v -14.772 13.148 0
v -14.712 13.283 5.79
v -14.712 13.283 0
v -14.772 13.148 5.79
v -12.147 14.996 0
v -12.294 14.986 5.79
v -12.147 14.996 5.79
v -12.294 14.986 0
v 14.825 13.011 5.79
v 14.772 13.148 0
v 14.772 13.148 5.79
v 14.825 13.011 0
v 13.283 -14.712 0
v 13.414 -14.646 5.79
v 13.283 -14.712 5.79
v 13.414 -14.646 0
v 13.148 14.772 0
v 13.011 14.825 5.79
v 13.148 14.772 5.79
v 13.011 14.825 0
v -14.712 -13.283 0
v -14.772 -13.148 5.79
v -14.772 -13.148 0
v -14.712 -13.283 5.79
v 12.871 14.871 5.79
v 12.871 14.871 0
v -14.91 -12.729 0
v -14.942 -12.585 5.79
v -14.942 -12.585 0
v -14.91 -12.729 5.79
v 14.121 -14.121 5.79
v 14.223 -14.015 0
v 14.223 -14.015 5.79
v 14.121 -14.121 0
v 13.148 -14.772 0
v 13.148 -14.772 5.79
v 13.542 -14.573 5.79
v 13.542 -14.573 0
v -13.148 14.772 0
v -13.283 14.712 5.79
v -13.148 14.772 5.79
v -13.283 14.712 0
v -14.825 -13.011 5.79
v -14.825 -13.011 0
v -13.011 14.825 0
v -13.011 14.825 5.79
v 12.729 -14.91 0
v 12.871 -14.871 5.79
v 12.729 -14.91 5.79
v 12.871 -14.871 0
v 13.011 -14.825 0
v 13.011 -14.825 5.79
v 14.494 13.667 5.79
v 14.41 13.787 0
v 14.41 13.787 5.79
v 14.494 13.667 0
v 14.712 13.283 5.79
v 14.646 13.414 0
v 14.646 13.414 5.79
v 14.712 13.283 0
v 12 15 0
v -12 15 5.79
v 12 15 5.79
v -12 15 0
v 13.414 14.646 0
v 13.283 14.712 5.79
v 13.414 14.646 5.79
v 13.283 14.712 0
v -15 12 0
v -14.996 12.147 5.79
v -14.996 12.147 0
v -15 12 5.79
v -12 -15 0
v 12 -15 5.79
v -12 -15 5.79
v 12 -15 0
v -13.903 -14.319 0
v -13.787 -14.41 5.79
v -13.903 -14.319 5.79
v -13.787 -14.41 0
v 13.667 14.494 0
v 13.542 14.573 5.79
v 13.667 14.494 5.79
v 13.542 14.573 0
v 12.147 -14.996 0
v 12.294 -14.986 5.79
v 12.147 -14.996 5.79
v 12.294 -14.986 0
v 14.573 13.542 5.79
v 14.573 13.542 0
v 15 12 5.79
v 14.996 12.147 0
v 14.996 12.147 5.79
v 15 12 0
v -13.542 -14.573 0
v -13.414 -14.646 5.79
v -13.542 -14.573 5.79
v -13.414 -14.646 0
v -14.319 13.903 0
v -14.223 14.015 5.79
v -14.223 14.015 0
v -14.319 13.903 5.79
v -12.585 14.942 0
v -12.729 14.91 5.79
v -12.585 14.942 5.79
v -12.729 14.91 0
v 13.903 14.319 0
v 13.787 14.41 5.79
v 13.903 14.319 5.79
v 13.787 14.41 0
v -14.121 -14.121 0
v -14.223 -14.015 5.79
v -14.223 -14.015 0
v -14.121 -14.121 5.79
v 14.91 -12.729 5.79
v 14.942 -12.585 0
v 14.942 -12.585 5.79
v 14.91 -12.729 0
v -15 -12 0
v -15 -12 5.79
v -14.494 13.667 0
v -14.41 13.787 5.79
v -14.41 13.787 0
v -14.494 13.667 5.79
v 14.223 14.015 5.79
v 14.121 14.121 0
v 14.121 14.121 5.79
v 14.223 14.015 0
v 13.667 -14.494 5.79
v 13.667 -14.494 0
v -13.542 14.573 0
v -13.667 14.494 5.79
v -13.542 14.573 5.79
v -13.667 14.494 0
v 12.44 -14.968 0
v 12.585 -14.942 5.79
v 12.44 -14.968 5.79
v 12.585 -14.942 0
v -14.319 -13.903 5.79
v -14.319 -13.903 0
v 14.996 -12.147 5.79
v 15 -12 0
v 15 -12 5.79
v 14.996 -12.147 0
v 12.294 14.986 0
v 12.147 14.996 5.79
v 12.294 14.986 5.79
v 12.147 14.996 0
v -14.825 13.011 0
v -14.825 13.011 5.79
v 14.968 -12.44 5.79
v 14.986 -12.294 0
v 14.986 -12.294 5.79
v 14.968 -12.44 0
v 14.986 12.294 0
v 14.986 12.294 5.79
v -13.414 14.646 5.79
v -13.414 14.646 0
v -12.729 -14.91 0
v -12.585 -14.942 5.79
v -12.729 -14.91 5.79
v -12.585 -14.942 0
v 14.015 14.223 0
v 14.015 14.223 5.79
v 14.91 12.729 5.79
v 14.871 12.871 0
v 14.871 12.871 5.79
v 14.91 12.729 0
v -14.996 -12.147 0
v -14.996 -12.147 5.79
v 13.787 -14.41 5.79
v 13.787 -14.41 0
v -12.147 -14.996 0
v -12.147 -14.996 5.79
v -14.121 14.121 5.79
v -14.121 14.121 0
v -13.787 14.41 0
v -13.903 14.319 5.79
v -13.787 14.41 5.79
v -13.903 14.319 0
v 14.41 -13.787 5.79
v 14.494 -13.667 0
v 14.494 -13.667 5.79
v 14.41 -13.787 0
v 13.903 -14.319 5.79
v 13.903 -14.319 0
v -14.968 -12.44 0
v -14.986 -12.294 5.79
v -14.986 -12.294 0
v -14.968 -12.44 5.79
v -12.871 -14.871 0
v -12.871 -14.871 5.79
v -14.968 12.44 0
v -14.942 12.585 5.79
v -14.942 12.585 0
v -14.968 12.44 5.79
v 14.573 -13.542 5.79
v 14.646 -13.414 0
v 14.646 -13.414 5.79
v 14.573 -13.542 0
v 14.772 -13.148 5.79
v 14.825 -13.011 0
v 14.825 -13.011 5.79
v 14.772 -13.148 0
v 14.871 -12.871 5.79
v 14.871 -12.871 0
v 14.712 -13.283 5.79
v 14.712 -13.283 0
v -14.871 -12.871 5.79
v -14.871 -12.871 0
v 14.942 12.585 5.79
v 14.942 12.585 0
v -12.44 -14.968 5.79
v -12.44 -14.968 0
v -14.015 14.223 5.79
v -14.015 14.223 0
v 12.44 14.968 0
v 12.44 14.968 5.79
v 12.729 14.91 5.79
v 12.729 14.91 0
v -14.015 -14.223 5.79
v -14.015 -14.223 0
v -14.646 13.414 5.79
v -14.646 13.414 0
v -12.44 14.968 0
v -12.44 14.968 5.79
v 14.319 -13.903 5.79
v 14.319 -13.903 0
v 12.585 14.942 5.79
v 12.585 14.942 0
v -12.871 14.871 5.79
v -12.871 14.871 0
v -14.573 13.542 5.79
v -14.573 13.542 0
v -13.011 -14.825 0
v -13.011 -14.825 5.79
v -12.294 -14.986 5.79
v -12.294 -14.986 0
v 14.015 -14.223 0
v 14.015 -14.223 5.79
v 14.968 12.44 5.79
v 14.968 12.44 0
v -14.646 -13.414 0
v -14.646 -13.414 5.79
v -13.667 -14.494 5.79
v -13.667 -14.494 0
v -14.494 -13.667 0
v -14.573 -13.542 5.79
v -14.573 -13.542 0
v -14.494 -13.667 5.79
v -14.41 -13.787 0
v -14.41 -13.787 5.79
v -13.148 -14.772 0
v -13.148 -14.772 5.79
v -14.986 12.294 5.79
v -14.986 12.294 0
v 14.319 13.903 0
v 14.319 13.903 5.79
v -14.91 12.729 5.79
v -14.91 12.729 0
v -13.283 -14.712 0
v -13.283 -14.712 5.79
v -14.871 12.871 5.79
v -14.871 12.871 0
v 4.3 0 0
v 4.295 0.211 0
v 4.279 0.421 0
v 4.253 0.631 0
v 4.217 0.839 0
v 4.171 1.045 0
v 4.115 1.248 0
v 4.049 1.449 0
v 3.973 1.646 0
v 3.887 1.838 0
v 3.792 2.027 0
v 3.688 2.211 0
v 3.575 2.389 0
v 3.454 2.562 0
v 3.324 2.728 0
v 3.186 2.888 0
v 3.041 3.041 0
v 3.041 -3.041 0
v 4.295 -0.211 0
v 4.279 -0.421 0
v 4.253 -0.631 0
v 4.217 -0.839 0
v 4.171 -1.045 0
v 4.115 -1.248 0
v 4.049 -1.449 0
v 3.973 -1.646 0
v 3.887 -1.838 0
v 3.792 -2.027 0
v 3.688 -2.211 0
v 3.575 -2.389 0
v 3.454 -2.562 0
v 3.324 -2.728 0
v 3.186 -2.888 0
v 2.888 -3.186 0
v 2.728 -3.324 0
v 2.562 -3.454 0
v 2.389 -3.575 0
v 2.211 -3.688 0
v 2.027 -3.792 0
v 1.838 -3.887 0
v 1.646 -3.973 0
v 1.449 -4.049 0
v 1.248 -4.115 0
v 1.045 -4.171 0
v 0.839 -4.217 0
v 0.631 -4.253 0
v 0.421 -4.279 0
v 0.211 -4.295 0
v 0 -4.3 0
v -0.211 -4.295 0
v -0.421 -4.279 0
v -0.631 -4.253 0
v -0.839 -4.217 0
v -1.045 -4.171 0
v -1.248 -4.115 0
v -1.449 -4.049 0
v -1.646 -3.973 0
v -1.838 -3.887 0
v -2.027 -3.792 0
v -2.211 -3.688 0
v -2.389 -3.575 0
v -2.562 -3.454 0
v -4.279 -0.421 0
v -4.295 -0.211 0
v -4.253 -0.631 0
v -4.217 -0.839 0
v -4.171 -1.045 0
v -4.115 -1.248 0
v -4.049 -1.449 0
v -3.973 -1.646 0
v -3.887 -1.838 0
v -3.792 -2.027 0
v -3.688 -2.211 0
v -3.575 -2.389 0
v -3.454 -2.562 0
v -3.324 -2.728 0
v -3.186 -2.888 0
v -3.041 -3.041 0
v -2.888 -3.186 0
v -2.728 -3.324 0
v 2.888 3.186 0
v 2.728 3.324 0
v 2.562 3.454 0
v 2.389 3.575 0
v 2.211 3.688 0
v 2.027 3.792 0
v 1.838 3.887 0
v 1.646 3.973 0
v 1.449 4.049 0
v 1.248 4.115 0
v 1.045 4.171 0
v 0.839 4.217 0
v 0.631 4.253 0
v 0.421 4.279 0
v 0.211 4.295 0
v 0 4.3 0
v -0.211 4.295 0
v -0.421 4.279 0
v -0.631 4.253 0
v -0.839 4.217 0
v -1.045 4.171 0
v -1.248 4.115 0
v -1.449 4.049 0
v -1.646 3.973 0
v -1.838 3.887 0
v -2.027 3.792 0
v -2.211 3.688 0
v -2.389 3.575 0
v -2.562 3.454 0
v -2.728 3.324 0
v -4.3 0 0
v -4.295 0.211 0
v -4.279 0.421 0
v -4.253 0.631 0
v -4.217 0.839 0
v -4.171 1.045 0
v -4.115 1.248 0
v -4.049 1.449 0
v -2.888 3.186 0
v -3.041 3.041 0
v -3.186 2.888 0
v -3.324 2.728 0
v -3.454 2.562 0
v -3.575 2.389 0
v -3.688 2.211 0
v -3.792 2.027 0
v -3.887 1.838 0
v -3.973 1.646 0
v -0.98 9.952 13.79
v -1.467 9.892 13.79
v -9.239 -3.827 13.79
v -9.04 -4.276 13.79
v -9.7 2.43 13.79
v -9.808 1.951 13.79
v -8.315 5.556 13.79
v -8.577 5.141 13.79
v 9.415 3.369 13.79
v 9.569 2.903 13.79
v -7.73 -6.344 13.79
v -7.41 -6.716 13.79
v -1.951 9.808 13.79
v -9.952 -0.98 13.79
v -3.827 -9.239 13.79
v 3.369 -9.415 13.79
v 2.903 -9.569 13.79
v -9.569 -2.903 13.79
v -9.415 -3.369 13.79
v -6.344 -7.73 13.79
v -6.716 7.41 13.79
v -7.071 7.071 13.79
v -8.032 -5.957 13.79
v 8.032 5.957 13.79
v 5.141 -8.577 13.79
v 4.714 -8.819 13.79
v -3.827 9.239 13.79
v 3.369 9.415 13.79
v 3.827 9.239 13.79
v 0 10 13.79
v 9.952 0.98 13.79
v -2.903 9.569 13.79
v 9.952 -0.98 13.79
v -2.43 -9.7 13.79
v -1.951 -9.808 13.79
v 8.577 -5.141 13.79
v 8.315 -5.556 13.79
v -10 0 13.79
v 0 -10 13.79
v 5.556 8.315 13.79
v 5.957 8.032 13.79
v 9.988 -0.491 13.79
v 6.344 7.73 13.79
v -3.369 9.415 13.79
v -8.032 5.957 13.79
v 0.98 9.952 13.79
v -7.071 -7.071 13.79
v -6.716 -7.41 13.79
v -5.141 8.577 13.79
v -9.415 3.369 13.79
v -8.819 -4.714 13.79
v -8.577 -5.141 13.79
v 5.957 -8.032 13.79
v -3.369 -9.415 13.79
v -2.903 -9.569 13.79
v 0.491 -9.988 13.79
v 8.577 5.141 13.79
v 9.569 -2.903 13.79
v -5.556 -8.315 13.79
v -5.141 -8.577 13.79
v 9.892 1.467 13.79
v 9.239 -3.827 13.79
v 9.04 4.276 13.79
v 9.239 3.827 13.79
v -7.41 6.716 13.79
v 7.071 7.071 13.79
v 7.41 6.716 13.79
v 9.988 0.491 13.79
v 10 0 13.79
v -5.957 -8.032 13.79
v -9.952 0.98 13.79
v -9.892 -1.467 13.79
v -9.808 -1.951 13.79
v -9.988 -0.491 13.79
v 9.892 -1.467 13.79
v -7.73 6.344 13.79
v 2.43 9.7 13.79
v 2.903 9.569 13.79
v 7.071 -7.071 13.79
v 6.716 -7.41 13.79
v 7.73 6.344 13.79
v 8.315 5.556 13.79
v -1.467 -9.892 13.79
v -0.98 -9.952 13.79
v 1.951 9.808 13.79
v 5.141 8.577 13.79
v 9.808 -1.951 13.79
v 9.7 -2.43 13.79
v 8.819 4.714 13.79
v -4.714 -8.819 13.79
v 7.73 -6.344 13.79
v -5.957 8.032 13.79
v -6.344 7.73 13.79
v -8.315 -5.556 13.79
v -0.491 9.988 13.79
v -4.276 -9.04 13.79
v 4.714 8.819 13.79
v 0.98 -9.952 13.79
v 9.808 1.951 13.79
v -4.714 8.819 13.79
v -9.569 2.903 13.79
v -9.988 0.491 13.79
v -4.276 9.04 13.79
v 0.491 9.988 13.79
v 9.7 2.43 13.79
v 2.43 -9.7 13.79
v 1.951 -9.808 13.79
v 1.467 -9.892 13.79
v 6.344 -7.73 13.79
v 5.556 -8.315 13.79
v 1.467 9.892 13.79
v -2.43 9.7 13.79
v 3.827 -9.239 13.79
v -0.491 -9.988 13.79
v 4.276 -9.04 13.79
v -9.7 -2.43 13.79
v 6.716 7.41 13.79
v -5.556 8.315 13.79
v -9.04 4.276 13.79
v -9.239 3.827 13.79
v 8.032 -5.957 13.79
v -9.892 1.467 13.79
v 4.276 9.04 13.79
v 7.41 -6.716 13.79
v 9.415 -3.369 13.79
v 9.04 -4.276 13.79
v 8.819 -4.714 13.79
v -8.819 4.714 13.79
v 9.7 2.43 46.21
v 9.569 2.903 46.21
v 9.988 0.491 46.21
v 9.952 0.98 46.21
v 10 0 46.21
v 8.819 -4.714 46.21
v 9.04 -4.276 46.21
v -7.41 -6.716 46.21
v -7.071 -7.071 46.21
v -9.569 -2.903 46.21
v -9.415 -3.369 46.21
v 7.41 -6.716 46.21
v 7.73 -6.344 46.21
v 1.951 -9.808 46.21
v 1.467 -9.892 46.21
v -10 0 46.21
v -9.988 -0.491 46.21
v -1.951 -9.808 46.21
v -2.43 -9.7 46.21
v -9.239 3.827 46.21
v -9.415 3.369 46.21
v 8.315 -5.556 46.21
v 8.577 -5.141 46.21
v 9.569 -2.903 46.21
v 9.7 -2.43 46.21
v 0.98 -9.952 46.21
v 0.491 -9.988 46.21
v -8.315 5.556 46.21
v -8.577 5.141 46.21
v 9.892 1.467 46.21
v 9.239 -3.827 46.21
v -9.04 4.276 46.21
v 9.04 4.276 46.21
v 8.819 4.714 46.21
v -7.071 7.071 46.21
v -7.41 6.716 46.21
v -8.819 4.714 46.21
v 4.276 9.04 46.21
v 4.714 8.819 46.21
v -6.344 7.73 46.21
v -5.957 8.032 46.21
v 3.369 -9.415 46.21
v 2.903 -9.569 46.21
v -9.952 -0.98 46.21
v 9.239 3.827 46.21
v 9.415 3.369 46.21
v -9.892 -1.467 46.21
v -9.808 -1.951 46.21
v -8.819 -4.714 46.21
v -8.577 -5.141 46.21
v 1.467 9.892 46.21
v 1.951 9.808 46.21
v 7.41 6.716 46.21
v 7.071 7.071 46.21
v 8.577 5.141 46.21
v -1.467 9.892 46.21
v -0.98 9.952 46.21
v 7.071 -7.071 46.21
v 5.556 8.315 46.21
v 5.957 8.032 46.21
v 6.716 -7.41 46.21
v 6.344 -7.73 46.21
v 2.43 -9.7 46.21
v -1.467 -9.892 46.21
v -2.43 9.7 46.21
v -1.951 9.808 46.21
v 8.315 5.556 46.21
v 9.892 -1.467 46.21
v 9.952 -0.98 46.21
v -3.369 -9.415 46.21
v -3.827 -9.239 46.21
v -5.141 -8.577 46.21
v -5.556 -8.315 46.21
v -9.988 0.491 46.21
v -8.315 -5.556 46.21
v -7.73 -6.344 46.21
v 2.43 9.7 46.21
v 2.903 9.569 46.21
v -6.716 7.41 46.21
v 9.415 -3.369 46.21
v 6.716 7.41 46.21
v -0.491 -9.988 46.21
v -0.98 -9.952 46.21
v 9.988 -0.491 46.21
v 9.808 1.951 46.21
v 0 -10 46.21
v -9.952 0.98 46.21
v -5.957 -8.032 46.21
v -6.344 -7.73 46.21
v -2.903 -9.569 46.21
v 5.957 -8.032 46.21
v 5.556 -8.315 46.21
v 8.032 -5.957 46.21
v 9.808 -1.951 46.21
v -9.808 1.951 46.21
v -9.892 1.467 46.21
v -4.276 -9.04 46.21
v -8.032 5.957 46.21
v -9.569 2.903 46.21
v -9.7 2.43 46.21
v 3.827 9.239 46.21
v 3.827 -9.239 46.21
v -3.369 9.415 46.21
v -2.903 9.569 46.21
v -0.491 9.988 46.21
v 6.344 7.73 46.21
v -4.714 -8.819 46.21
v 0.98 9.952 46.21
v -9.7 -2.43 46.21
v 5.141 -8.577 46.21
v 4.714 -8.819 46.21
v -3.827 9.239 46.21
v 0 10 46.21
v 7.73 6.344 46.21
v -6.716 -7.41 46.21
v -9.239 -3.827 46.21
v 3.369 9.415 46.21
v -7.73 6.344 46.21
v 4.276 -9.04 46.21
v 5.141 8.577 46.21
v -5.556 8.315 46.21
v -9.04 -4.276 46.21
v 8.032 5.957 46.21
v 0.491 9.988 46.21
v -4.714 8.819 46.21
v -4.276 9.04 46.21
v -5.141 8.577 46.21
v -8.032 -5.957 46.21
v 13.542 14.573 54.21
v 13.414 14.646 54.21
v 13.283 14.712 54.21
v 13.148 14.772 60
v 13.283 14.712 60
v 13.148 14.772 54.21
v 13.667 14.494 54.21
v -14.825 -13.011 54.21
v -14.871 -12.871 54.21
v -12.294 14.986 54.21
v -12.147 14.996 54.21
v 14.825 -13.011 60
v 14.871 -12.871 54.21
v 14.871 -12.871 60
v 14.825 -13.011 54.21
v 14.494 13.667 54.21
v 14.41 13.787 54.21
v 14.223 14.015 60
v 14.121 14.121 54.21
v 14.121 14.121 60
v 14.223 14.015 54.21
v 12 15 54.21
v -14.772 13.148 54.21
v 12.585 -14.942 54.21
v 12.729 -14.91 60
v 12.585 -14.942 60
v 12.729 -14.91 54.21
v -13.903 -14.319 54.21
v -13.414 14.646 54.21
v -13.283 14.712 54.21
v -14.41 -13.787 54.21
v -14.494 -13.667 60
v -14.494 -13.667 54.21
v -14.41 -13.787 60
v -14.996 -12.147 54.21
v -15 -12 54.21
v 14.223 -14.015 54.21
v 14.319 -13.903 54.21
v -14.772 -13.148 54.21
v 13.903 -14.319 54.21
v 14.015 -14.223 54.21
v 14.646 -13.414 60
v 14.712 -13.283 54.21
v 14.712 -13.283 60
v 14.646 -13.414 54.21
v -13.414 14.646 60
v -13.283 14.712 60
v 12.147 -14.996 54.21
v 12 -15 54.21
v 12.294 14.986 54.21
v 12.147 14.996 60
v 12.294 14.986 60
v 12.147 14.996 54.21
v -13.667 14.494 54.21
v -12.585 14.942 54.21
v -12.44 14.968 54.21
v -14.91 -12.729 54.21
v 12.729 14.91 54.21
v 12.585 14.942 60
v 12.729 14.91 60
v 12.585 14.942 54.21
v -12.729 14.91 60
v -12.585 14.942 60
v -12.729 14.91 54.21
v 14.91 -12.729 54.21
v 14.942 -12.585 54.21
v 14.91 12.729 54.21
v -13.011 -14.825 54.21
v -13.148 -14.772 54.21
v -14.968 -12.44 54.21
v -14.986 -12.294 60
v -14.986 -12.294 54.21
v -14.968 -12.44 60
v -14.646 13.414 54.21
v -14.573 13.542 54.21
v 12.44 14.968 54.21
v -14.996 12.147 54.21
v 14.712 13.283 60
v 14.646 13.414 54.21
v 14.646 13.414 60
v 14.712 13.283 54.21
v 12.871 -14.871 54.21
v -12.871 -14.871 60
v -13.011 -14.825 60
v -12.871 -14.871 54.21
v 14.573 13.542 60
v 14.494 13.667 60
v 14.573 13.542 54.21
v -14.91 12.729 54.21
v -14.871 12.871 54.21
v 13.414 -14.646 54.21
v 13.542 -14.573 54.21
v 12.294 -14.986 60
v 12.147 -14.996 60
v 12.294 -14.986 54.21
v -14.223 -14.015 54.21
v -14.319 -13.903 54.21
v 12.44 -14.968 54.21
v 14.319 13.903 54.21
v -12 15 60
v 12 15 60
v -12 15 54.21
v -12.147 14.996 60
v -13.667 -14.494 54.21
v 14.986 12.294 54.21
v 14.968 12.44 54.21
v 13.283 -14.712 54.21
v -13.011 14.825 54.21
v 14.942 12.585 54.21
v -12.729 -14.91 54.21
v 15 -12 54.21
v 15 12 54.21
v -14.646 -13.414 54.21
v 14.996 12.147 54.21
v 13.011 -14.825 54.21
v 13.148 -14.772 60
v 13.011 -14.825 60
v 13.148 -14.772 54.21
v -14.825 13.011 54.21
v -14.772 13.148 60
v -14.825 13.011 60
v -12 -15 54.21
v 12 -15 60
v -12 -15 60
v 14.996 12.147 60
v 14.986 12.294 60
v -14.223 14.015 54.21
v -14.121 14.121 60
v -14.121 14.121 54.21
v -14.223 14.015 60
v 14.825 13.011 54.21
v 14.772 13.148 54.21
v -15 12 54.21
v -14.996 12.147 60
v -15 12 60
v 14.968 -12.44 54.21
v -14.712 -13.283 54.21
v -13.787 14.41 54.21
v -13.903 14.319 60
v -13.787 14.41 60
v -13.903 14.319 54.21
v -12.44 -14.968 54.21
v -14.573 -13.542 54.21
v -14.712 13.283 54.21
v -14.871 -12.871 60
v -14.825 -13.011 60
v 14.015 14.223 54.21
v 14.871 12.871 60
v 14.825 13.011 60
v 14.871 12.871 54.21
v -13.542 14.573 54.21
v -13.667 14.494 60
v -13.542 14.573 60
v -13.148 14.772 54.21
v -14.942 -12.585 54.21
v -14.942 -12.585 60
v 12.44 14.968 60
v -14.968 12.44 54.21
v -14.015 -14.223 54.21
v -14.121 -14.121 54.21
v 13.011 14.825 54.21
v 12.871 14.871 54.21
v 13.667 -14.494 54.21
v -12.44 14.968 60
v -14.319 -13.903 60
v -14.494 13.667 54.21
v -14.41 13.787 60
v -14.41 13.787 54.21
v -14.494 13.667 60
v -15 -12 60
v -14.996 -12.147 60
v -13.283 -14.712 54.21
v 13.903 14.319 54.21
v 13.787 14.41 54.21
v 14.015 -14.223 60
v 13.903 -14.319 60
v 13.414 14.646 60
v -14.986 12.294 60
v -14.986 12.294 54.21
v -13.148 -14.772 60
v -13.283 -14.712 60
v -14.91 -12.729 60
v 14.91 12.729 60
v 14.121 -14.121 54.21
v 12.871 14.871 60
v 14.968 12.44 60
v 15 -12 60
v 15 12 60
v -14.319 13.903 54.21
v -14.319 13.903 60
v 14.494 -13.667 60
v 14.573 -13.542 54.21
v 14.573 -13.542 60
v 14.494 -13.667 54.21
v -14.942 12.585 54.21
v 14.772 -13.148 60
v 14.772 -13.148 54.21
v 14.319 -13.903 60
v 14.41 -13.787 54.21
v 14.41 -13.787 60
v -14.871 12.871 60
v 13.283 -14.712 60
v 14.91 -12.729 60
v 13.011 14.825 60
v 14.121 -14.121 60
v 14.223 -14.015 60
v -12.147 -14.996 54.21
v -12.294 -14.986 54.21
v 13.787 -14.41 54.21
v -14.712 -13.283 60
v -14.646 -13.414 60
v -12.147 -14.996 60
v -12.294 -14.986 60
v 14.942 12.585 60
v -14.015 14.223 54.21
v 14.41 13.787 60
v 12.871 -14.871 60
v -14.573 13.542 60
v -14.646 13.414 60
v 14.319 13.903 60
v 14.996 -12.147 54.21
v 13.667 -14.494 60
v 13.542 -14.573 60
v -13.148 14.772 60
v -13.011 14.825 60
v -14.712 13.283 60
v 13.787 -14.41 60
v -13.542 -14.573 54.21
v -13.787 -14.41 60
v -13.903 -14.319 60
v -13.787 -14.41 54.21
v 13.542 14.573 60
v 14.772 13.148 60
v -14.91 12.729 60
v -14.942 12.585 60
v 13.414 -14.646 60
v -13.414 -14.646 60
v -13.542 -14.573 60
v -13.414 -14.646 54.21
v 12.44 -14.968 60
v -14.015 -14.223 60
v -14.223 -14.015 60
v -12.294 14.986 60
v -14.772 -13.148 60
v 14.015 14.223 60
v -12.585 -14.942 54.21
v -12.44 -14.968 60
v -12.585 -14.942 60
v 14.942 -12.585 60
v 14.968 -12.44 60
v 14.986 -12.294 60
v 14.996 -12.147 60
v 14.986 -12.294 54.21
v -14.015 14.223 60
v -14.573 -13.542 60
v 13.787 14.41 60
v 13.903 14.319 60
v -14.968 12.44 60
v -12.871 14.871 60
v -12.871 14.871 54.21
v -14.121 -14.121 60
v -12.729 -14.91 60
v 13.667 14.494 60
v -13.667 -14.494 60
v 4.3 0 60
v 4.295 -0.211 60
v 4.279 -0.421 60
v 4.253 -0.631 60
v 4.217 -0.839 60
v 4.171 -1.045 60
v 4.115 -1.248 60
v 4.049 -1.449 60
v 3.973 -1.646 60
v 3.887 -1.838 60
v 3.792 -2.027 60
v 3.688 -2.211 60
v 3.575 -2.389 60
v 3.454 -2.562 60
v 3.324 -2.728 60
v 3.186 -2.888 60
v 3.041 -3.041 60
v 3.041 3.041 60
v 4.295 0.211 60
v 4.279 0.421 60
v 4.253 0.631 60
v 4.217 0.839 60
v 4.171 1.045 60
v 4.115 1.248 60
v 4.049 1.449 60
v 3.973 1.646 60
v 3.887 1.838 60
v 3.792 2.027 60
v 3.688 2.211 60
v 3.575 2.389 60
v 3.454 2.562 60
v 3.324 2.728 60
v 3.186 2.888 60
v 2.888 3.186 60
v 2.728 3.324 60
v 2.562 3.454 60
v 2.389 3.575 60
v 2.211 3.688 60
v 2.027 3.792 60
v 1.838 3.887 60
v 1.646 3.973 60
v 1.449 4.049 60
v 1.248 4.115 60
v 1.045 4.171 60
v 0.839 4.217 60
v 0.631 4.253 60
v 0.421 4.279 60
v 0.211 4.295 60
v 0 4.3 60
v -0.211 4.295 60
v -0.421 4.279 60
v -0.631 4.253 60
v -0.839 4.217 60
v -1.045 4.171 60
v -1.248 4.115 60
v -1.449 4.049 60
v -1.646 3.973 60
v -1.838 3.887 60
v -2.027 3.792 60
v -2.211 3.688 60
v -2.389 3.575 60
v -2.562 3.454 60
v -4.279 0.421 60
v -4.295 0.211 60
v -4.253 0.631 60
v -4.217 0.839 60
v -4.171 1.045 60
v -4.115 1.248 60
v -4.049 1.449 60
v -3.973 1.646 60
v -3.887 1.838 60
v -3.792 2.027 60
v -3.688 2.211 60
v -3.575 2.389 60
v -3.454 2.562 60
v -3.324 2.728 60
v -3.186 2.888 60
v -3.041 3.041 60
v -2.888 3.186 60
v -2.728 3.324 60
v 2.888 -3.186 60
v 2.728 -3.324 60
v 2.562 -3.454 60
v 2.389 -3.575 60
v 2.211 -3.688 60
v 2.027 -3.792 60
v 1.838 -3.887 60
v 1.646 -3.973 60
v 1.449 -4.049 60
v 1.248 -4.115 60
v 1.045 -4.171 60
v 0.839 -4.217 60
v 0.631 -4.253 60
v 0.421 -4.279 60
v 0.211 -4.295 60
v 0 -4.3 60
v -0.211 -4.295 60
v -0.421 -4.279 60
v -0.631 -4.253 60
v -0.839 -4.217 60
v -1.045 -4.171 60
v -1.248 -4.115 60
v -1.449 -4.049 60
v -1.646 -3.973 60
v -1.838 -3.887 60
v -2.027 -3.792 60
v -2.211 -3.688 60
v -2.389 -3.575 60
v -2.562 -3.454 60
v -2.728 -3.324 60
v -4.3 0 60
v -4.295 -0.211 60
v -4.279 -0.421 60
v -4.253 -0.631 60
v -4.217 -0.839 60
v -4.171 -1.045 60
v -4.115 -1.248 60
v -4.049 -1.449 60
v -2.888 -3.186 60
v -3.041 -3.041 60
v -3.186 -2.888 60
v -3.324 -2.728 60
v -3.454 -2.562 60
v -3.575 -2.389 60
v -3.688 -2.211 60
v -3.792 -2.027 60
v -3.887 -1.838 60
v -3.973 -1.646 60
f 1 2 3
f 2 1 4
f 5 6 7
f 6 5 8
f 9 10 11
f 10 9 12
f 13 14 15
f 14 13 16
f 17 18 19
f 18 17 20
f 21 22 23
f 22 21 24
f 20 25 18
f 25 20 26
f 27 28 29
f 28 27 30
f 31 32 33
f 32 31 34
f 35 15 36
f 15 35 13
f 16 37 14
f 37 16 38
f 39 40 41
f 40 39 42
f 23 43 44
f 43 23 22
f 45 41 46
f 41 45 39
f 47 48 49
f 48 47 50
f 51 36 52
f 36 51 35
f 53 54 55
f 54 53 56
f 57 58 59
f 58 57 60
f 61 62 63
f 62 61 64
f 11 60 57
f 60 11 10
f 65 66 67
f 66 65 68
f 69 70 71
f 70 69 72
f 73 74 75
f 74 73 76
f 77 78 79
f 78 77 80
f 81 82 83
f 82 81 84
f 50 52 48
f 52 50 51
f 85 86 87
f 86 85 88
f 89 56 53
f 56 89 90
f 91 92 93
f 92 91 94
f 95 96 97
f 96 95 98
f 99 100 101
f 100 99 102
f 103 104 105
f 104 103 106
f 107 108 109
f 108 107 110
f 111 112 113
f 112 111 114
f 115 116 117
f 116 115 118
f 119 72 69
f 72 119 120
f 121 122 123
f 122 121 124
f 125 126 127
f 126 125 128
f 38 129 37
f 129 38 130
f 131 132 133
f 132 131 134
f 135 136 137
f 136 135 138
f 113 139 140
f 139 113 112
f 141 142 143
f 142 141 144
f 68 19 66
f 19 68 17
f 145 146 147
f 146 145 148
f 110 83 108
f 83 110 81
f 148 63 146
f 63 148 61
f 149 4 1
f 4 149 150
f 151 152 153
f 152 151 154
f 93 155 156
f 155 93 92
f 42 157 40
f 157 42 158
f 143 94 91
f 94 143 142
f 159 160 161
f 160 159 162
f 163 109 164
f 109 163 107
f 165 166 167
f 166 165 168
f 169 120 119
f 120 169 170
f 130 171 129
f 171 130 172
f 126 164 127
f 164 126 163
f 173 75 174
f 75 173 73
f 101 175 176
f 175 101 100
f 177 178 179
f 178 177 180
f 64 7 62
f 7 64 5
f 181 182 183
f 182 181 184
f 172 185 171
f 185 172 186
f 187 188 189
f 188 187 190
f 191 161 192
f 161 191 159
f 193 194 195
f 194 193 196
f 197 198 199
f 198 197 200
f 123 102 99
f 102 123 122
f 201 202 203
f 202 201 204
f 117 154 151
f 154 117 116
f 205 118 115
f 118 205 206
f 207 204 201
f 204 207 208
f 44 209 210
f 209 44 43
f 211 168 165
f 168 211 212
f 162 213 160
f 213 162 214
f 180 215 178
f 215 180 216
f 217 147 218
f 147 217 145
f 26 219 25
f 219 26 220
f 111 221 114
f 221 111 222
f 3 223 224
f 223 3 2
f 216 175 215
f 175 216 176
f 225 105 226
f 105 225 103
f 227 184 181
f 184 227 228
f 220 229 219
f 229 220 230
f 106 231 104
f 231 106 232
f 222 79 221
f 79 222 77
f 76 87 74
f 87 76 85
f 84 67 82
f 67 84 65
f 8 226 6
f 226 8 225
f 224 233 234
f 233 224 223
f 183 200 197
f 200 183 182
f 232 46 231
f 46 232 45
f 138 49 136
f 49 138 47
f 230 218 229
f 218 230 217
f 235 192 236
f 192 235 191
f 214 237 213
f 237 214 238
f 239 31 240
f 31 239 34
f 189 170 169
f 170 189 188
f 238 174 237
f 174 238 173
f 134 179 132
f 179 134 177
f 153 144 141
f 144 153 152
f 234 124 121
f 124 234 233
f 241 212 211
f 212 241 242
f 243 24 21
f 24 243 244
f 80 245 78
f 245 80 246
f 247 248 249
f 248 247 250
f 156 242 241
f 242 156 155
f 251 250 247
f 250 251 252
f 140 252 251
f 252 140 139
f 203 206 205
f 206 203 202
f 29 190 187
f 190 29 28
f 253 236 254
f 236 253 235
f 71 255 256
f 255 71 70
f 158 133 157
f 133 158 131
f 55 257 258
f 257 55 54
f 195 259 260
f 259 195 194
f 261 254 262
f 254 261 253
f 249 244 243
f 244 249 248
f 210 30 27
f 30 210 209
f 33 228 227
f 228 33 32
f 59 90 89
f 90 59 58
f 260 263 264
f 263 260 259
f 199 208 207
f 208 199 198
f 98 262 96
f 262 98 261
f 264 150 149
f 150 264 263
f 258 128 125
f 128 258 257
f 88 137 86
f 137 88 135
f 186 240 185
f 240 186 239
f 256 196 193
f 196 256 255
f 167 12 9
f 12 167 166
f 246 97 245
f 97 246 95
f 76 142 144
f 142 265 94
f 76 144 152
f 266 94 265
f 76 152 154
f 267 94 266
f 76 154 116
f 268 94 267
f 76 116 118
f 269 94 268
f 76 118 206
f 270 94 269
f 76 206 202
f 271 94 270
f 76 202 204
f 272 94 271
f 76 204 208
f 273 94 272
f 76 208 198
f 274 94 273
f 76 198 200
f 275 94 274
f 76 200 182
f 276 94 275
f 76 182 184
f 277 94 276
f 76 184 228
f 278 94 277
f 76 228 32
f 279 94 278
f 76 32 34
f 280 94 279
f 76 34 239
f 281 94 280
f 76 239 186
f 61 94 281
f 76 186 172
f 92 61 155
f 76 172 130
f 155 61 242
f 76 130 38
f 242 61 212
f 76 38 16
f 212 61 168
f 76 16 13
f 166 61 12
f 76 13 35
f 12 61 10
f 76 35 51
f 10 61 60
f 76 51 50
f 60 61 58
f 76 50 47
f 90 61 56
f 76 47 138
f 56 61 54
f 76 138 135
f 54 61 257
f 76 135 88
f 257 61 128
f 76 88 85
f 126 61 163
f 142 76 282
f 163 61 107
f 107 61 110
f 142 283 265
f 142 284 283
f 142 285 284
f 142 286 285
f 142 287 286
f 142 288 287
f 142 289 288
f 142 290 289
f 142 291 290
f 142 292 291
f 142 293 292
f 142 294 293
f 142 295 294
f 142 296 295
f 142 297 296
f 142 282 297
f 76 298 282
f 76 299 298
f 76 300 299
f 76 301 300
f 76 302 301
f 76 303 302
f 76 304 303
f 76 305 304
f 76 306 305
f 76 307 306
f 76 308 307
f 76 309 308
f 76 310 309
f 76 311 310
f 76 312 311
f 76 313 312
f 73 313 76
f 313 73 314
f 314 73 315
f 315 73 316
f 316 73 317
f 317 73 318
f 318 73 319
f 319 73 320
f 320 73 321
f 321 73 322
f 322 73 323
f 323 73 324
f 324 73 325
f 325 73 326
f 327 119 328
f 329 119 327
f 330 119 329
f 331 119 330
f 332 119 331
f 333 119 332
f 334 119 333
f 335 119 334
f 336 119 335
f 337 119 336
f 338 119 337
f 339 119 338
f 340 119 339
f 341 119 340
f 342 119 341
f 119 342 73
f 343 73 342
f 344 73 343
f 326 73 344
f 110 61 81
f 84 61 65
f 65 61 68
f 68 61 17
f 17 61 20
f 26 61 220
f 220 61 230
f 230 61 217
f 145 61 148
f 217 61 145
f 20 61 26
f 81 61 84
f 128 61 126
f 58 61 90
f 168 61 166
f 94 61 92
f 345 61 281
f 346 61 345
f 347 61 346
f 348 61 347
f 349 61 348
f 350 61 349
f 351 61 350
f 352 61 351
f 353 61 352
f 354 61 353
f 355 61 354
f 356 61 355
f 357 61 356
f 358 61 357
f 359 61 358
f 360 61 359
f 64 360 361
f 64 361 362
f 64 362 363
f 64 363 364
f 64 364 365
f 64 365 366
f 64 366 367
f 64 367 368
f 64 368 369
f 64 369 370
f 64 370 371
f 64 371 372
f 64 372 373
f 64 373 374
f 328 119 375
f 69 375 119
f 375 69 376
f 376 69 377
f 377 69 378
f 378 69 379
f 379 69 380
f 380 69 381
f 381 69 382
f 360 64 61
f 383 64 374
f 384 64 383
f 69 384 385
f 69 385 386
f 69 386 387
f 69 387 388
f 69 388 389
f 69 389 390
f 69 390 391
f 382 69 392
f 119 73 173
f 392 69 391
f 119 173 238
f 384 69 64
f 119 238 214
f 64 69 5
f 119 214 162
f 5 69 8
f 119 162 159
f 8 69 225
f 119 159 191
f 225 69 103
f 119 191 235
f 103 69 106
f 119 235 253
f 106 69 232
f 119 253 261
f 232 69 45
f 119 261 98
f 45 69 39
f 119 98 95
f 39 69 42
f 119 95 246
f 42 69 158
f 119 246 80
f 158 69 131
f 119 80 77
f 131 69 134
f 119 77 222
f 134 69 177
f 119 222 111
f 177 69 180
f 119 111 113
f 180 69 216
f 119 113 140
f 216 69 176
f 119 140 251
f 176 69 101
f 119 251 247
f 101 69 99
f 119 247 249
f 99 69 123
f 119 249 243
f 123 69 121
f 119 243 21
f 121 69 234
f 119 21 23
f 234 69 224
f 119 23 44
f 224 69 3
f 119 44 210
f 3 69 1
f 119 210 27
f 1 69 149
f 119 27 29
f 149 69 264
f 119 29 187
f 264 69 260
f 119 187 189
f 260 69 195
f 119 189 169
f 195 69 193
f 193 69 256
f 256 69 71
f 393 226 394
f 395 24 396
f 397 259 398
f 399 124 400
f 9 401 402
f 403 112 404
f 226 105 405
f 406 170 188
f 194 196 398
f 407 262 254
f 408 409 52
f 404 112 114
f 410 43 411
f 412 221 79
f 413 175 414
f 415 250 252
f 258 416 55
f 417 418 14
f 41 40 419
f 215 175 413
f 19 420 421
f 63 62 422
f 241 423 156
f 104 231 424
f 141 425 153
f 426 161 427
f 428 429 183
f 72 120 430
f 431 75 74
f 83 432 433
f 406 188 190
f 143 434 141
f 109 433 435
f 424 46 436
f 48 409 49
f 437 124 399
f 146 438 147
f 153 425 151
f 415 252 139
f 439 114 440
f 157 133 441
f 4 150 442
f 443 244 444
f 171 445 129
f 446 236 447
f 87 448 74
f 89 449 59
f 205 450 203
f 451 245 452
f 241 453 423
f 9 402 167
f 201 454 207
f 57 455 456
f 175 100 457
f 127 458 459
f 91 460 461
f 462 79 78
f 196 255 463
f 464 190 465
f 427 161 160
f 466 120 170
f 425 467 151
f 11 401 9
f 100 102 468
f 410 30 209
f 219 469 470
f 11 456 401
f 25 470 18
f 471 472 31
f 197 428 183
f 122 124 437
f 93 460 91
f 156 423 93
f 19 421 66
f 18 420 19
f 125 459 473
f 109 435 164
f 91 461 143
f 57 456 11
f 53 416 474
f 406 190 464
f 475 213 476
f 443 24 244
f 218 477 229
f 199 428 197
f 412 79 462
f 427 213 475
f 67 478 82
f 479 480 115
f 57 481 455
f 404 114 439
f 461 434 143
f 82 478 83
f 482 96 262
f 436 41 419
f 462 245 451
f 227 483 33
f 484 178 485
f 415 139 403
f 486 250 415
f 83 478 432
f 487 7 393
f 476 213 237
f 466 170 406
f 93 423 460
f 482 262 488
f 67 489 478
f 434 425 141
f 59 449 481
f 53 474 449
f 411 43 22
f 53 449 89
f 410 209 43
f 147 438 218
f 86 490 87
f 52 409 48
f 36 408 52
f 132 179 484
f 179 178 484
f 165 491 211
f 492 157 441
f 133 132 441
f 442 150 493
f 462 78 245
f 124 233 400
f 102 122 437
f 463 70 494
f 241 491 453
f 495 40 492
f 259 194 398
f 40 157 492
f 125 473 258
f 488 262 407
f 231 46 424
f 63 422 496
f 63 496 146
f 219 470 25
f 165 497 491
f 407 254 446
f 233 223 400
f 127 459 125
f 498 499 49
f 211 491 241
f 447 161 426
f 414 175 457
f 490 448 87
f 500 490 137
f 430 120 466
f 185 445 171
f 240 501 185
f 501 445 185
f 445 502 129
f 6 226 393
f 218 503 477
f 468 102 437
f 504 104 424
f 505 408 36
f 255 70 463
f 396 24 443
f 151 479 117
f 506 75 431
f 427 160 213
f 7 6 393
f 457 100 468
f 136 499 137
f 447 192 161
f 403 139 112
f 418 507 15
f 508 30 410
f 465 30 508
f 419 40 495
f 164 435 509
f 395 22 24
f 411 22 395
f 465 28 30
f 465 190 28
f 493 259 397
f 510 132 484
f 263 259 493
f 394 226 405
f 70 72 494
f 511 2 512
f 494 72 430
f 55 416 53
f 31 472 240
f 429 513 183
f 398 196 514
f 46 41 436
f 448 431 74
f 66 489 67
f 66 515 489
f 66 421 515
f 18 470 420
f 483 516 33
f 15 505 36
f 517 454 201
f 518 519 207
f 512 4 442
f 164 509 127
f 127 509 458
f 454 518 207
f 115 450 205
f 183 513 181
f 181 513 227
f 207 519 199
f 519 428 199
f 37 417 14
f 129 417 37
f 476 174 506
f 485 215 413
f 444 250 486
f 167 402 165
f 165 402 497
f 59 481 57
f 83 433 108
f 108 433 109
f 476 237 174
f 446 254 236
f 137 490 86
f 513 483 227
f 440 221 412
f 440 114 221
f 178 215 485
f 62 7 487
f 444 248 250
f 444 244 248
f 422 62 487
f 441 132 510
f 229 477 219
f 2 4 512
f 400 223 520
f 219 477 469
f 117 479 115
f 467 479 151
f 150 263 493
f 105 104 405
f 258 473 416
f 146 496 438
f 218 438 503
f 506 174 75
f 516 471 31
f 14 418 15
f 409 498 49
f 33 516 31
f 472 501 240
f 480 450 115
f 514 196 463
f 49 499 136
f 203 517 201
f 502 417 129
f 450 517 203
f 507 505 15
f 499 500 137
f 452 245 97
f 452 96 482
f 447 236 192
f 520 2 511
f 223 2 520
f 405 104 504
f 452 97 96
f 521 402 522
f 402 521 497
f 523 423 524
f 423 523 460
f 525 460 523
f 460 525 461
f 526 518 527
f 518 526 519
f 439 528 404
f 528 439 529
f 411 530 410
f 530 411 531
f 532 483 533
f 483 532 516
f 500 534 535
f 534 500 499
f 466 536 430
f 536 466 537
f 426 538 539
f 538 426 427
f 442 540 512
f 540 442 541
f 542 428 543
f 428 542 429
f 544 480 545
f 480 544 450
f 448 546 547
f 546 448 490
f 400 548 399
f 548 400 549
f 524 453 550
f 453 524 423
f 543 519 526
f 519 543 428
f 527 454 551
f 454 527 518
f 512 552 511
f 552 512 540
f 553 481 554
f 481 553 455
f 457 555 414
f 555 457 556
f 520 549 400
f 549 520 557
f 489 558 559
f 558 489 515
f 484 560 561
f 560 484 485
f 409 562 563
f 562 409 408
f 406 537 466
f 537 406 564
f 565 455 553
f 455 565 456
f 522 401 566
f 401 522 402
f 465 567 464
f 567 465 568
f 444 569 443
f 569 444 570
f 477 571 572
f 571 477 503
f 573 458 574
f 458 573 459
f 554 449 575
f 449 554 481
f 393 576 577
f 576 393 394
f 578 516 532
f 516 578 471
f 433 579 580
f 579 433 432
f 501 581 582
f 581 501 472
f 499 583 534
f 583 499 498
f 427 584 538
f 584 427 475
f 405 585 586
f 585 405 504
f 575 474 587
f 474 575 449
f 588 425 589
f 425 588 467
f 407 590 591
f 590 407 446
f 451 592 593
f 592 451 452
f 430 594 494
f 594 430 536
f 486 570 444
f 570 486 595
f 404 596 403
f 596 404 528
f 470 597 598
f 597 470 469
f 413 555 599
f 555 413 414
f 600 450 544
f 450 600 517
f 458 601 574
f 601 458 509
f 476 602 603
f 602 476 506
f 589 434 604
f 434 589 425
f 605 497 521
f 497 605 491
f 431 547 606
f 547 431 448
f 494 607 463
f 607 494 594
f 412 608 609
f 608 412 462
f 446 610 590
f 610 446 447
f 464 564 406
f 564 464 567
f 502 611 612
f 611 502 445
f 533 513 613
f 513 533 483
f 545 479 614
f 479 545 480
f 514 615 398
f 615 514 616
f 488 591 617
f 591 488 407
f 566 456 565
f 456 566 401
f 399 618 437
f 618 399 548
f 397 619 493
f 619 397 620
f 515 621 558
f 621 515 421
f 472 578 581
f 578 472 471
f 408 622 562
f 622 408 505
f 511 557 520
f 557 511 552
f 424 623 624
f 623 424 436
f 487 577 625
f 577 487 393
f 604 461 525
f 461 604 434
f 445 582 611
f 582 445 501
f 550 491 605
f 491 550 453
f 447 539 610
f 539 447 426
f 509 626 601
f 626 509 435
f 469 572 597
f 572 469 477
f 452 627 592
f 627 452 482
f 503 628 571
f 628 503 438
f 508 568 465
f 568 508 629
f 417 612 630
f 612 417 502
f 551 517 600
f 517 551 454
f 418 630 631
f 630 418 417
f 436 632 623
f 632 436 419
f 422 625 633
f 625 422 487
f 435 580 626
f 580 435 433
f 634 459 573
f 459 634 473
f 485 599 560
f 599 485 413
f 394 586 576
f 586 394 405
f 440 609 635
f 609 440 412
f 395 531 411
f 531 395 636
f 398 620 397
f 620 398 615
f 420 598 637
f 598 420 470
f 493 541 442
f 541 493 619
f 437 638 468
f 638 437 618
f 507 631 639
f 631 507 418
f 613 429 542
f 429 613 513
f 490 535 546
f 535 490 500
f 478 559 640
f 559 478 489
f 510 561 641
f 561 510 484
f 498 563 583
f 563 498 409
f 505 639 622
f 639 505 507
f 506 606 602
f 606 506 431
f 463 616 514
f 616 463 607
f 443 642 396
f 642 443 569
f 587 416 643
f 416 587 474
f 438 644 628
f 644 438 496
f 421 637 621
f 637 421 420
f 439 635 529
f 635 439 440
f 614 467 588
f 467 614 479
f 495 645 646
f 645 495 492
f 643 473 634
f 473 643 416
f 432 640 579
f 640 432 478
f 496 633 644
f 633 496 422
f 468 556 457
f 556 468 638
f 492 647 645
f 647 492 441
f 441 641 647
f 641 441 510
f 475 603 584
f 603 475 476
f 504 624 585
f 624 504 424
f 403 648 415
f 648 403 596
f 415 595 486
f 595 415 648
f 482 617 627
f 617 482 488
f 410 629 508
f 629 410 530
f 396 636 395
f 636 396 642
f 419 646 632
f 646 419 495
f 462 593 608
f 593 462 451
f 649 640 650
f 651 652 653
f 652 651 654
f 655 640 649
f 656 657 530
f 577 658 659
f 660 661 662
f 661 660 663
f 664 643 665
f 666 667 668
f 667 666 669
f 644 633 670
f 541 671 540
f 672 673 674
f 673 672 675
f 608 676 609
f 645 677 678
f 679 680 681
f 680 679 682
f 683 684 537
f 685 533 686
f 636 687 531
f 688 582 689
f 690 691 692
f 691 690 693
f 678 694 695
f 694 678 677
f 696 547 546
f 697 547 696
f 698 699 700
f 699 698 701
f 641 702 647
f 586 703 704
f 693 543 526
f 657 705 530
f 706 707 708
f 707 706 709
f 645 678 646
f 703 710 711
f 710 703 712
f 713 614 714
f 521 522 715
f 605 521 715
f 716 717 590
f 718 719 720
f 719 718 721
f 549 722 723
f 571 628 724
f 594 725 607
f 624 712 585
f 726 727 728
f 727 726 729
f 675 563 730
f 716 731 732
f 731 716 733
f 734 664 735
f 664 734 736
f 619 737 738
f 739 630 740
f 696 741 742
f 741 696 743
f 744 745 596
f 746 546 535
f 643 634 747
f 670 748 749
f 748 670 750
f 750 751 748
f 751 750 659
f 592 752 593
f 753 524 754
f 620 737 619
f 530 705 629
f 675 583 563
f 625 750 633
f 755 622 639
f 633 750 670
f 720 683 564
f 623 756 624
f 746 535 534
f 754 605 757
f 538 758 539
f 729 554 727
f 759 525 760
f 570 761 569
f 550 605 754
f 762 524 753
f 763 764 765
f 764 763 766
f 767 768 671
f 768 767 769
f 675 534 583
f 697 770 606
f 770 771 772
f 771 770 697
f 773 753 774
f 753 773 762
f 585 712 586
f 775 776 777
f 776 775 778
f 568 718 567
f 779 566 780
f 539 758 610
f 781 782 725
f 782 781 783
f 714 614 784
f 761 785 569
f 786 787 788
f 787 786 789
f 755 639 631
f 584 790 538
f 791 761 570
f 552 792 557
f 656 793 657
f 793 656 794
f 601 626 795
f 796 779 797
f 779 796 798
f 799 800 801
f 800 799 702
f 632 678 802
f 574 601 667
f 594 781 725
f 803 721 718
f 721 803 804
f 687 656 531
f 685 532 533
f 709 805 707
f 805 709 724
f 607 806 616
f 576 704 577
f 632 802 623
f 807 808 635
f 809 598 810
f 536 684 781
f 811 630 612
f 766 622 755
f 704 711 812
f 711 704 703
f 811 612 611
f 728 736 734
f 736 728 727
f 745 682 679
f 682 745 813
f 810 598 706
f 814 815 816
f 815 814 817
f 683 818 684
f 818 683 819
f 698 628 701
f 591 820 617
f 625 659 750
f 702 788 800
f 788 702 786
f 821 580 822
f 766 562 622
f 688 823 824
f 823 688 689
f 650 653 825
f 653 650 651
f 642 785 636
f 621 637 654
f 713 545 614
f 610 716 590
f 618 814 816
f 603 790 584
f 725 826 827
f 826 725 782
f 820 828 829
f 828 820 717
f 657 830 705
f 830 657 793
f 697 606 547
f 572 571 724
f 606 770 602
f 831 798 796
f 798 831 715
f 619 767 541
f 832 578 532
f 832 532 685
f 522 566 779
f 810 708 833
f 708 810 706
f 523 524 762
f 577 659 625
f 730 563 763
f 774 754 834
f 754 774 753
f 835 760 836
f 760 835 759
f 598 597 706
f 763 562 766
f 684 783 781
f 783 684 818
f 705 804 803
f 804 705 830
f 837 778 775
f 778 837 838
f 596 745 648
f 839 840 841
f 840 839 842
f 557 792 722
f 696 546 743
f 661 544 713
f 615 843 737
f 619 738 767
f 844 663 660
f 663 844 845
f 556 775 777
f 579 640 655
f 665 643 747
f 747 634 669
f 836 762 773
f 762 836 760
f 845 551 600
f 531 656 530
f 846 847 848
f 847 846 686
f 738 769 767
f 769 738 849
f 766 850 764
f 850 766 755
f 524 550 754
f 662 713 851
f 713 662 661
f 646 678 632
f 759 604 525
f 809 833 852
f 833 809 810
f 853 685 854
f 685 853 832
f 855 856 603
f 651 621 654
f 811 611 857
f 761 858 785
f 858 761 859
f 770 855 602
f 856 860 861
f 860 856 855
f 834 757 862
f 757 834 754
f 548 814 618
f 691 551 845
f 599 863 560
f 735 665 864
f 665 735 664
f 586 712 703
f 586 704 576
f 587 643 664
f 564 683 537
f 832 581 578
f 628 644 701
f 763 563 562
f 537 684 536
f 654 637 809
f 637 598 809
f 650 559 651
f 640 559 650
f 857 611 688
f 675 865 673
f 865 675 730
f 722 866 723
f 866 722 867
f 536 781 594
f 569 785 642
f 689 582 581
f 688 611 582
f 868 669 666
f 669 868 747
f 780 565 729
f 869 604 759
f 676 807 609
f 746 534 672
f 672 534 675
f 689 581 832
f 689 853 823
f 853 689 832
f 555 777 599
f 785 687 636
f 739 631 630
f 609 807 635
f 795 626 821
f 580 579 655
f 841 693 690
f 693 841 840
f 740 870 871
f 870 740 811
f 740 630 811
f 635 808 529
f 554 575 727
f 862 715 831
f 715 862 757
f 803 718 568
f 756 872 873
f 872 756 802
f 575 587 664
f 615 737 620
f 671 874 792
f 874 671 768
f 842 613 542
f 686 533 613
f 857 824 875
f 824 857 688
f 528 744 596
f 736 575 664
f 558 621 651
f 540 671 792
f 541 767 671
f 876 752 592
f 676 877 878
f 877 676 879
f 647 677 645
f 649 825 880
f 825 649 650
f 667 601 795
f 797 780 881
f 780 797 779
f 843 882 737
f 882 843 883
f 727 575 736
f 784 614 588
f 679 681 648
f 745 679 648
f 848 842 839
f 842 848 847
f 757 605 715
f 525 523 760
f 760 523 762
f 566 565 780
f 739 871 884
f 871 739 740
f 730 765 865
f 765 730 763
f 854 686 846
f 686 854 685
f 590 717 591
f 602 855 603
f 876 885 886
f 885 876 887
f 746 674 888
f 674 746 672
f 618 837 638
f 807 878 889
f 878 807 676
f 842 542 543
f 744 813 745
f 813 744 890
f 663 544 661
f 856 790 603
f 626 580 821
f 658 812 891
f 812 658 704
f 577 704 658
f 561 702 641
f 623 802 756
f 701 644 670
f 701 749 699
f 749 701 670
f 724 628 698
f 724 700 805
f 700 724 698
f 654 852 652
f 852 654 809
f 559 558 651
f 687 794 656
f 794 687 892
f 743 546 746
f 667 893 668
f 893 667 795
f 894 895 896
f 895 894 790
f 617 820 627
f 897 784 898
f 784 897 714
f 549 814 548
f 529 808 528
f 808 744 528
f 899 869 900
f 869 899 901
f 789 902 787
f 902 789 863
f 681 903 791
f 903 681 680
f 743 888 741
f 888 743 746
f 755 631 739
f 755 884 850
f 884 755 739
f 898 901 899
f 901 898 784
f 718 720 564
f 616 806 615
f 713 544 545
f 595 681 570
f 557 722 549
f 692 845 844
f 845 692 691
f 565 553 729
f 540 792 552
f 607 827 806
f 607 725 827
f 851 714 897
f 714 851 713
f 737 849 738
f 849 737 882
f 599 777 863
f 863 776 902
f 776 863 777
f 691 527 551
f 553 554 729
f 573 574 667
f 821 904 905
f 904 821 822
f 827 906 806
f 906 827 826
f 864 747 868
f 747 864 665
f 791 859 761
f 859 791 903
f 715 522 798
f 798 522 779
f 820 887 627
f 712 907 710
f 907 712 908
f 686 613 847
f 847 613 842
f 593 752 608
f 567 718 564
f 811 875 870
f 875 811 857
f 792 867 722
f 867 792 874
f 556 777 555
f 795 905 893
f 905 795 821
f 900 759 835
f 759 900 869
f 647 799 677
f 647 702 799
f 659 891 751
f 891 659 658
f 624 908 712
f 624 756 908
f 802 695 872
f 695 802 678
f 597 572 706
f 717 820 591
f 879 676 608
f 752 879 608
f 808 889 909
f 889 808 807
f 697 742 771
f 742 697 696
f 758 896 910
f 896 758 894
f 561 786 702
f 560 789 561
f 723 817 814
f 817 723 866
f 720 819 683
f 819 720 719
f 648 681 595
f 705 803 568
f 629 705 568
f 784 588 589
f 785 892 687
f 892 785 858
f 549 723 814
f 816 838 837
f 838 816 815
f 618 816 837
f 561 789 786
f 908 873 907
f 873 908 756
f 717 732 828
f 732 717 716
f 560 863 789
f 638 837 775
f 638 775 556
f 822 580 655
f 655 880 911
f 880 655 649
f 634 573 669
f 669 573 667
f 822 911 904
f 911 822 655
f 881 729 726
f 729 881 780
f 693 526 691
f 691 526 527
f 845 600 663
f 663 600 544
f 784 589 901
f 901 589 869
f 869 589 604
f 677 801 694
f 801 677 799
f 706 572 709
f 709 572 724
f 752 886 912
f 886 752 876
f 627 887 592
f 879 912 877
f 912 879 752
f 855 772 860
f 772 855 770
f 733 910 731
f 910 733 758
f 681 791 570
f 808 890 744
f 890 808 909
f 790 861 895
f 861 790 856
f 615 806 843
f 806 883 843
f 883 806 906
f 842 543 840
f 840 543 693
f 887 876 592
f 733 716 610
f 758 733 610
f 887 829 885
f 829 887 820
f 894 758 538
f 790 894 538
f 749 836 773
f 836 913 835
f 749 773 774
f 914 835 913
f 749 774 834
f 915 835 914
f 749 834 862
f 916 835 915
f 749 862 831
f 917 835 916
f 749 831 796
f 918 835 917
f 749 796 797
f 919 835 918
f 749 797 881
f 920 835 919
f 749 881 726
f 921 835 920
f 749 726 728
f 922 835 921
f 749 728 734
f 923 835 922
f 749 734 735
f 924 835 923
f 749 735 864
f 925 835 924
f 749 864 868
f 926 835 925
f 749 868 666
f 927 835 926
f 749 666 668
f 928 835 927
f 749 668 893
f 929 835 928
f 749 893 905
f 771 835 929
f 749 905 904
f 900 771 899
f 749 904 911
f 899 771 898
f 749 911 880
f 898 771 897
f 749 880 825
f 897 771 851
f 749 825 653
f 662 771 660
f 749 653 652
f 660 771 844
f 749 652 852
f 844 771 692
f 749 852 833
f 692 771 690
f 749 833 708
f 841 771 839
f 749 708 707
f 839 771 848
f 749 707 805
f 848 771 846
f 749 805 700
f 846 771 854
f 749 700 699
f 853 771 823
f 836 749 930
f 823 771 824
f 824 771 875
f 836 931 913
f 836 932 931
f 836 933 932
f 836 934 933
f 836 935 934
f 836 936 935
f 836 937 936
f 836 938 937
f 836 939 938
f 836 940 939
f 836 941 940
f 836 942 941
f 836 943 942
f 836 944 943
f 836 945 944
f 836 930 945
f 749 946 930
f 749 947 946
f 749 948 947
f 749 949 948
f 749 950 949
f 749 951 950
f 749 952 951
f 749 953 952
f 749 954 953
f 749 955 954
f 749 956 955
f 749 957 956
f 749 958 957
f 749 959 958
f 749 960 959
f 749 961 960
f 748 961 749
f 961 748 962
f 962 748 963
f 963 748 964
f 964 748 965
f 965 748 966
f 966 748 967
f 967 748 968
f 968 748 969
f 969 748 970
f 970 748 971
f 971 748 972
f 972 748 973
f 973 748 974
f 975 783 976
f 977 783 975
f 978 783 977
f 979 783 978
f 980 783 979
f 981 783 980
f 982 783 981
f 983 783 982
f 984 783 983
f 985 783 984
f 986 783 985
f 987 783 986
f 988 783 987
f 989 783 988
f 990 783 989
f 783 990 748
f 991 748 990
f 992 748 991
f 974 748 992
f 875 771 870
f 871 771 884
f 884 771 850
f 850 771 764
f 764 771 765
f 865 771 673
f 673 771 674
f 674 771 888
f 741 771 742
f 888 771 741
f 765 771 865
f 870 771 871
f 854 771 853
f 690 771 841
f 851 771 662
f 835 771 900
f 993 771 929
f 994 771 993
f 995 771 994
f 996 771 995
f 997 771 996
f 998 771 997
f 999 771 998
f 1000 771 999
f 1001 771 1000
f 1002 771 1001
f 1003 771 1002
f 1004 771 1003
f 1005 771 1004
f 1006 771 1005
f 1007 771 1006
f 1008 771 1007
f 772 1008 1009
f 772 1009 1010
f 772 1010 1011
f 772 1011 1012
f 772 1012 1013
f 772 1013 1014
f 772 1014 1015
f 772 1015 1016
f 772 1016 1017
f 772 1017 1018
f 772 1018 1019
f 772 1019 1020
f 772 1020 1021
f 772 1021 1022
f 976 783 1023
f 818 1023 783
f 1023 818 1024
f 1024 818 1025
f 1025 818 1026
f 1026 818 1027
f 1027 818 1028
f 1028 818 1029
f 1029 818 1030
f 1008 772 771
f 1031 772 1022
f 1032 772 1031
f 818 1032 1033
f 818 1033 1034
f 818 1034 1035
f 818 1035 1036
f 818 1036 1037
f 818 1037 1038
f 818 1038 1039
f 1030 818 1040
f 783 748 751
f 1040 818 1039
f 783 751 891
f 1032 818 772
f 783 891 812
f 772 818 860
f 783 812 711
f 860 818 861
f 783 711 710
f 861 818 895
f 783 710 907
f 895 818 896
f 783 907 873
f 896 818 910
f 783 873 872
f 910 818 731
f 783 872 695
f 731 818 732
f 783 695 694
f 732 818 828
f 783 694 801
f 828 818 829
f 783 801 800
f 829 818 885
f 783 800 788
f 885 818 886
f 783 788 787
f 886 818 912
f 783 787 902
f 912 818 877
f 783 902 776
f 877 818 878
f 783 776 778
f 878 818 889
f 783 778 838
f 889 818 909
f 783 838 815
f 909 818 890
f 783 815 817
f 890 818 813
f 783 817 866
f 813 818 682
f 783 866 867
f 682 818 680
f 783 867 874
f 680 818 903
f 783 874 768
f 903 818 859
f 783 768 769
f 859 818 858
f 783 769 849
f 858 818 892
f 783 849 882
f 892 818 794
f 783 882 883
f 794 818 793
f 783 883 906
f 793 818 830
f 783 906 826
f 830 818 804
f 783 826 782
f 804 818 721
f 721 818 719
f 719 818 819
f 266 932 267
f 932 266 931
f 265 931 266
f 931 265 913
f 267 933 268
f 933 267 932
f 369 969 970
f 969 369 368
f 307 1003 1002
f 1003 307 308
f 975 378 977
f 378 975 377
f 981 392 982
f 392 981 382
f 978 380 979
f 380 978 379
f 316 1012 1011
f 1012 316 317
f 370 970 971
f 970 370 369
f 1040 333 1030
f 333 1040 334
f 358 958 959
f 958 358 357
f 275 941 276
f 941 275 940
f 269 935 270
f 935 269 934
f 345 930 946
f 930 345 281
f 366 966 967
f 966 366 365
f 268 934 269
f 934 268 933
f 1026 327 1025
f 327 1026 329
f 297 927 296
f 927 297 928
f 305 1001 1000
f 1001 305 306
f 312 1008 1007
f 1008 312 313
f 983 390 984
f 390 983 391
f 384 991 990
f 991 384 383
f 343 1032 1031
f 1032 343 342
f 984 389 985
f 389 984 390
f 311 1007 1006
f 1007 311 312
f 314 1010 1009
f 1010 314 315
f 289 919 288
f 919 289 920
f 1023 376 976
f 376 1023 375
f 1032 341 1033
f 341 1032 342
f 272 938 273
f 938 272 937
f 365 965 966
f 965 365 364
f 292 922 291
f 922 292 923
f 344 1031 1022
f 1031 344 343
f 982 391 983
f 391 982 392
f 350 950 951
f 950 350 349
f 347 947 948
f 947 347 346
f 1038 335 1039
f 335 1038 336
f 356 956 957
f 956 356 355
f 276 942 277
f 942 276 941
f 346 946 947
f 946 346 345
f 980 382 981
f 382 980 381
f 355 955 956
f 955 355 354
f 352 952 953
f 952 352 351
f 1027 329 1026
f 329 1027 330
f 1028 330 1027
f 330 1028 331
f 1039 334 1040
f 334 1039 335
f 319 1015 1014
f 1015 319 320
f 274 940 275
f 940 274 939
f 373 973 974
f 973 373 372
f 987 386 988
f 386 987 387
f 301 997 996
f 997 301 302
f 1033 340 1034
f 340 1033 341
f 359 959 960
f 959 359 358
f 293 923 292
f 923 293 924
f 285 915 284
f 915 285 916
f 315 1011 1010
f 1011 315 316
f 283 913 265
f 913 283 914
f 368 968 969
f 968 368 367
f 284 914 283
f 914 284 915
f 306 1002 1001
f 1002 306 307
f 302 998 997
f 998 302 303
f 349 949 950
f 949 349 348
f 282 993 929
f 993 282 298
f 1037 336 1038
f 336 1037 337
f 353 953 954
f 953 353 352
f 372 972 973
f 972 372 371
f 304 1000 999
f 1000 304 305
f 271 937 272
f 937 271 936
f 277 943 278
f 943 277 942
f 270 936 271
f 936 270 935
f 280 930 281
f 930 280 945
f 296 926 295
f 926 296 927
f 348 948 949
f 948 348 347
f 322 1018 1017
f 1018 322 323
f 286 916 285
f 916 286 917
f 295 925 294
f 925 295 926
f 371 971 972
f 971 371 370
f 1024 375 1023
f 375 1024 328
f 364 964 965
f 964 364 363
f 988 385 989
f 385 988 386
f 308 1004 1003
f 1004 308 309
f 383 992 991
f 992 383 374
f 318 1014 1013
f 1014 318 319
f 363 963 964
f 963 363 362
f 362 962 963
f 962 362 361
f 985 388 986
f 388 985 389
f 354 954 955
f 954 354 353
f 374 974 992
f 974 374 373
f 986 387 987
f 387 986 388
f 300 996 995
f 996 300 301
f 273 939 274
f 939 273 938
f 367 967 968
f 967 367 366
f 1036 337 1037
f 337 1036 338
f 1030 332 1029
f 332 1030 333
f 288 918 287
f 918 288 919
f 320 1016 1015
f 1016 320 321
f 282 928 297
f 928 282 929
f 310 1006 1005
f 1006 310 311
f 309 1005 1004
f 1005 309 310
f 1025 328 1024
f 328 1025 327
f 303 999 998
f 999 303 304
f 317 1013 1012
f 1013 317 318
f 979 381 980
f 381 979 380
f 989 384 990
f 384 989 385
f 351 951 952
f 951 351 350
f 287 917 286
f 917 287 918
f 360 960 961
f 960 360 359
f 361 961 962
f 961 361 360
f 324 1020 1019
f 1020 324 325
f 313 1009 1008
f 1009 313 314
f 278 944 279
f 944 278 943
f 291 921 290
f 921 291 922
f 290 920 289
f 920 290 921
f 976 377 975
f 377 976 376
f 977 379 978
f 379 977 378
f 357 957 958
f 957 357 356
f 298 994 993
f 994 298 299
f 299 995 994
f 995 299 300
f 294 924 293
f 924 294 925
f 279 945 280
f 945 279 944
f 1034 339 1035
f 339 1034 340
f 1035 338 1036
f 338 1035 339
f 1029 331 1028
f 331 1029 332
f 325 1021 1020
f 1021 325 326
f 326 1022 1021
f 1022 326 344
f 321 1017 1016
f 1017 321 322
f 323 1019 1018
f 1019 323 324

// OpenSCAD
$fn = 128;

// V70 emergency spindle support sleeve
// Slides over the Ø8 RH8x2 working screw and bridges the measured 60 mm gap
// between base and clamp. The broad end pads spread lateral load into both parts.

length = 60.00;
bore_d = 8.60;          // 0.30 mm radial running clearance over Ø8 screw
pad_xy = 30.00;         // largest symmetric square around spindle at x/y = 15 mm on clamp
pad_r = 3.00;
pad_t = 5.00;
tube_d = 20.00;
transition_h = 8.00;

module rounded_square_2d(size, r) {
    offset(r=r)
        square([size-2*r, size-2*r], center=true);
}

module pad(h) {
    linear_extrude(height=h)
        rounded_square_2d(pad_xy, pad_r);
}

module end_transition(z0, flip=false) {
    // Smooth, heavily gusseted transition from the 30x30 bearing pad to Ø20 tube.
    if (!flip) {
        hull() {
            translate([0,0,z0])
                linear_extrude(height=0.8)
                    rounded_square_2d(pad_xy, pad_r);
            translate([0,0,z0+transition_h])
                cylinder(d=tube_d,h=0.8);
        }
    } else {
        hull() {
            translate([0,0,z0])
                cylinder(d=tube_d,h=0.8);
            translate([0,0,z0+transition_h])
                linear_extrude(height=0.8)
                    rounded_square_2d(pad_xy, pad_r);
        }
    }
}

difference() {
    union() {
        // Base-side bearing pad.
        pad(pad_t);

        // Broad load transition.
        end_transition(pad_t-0.01, false);

        // Central stiff guide body.
        translate([0,0,pad_t+transition_h-0.01])
            cylinder(d=tube_d,
                     h=length-2*(pad_t+transition_h)+0.02);

        // Clamp-side transition and bearing pad.
        end_transition(length-pad_t-transition_h-0.79, true);
        translate([0,0,length-pad_t])
            pad(pad_t);
    }

    // Continuous screw clearance bore.
    translate([0,0,-0.5])
        cylinder(d=bore_d,h=length+1.0);
}
